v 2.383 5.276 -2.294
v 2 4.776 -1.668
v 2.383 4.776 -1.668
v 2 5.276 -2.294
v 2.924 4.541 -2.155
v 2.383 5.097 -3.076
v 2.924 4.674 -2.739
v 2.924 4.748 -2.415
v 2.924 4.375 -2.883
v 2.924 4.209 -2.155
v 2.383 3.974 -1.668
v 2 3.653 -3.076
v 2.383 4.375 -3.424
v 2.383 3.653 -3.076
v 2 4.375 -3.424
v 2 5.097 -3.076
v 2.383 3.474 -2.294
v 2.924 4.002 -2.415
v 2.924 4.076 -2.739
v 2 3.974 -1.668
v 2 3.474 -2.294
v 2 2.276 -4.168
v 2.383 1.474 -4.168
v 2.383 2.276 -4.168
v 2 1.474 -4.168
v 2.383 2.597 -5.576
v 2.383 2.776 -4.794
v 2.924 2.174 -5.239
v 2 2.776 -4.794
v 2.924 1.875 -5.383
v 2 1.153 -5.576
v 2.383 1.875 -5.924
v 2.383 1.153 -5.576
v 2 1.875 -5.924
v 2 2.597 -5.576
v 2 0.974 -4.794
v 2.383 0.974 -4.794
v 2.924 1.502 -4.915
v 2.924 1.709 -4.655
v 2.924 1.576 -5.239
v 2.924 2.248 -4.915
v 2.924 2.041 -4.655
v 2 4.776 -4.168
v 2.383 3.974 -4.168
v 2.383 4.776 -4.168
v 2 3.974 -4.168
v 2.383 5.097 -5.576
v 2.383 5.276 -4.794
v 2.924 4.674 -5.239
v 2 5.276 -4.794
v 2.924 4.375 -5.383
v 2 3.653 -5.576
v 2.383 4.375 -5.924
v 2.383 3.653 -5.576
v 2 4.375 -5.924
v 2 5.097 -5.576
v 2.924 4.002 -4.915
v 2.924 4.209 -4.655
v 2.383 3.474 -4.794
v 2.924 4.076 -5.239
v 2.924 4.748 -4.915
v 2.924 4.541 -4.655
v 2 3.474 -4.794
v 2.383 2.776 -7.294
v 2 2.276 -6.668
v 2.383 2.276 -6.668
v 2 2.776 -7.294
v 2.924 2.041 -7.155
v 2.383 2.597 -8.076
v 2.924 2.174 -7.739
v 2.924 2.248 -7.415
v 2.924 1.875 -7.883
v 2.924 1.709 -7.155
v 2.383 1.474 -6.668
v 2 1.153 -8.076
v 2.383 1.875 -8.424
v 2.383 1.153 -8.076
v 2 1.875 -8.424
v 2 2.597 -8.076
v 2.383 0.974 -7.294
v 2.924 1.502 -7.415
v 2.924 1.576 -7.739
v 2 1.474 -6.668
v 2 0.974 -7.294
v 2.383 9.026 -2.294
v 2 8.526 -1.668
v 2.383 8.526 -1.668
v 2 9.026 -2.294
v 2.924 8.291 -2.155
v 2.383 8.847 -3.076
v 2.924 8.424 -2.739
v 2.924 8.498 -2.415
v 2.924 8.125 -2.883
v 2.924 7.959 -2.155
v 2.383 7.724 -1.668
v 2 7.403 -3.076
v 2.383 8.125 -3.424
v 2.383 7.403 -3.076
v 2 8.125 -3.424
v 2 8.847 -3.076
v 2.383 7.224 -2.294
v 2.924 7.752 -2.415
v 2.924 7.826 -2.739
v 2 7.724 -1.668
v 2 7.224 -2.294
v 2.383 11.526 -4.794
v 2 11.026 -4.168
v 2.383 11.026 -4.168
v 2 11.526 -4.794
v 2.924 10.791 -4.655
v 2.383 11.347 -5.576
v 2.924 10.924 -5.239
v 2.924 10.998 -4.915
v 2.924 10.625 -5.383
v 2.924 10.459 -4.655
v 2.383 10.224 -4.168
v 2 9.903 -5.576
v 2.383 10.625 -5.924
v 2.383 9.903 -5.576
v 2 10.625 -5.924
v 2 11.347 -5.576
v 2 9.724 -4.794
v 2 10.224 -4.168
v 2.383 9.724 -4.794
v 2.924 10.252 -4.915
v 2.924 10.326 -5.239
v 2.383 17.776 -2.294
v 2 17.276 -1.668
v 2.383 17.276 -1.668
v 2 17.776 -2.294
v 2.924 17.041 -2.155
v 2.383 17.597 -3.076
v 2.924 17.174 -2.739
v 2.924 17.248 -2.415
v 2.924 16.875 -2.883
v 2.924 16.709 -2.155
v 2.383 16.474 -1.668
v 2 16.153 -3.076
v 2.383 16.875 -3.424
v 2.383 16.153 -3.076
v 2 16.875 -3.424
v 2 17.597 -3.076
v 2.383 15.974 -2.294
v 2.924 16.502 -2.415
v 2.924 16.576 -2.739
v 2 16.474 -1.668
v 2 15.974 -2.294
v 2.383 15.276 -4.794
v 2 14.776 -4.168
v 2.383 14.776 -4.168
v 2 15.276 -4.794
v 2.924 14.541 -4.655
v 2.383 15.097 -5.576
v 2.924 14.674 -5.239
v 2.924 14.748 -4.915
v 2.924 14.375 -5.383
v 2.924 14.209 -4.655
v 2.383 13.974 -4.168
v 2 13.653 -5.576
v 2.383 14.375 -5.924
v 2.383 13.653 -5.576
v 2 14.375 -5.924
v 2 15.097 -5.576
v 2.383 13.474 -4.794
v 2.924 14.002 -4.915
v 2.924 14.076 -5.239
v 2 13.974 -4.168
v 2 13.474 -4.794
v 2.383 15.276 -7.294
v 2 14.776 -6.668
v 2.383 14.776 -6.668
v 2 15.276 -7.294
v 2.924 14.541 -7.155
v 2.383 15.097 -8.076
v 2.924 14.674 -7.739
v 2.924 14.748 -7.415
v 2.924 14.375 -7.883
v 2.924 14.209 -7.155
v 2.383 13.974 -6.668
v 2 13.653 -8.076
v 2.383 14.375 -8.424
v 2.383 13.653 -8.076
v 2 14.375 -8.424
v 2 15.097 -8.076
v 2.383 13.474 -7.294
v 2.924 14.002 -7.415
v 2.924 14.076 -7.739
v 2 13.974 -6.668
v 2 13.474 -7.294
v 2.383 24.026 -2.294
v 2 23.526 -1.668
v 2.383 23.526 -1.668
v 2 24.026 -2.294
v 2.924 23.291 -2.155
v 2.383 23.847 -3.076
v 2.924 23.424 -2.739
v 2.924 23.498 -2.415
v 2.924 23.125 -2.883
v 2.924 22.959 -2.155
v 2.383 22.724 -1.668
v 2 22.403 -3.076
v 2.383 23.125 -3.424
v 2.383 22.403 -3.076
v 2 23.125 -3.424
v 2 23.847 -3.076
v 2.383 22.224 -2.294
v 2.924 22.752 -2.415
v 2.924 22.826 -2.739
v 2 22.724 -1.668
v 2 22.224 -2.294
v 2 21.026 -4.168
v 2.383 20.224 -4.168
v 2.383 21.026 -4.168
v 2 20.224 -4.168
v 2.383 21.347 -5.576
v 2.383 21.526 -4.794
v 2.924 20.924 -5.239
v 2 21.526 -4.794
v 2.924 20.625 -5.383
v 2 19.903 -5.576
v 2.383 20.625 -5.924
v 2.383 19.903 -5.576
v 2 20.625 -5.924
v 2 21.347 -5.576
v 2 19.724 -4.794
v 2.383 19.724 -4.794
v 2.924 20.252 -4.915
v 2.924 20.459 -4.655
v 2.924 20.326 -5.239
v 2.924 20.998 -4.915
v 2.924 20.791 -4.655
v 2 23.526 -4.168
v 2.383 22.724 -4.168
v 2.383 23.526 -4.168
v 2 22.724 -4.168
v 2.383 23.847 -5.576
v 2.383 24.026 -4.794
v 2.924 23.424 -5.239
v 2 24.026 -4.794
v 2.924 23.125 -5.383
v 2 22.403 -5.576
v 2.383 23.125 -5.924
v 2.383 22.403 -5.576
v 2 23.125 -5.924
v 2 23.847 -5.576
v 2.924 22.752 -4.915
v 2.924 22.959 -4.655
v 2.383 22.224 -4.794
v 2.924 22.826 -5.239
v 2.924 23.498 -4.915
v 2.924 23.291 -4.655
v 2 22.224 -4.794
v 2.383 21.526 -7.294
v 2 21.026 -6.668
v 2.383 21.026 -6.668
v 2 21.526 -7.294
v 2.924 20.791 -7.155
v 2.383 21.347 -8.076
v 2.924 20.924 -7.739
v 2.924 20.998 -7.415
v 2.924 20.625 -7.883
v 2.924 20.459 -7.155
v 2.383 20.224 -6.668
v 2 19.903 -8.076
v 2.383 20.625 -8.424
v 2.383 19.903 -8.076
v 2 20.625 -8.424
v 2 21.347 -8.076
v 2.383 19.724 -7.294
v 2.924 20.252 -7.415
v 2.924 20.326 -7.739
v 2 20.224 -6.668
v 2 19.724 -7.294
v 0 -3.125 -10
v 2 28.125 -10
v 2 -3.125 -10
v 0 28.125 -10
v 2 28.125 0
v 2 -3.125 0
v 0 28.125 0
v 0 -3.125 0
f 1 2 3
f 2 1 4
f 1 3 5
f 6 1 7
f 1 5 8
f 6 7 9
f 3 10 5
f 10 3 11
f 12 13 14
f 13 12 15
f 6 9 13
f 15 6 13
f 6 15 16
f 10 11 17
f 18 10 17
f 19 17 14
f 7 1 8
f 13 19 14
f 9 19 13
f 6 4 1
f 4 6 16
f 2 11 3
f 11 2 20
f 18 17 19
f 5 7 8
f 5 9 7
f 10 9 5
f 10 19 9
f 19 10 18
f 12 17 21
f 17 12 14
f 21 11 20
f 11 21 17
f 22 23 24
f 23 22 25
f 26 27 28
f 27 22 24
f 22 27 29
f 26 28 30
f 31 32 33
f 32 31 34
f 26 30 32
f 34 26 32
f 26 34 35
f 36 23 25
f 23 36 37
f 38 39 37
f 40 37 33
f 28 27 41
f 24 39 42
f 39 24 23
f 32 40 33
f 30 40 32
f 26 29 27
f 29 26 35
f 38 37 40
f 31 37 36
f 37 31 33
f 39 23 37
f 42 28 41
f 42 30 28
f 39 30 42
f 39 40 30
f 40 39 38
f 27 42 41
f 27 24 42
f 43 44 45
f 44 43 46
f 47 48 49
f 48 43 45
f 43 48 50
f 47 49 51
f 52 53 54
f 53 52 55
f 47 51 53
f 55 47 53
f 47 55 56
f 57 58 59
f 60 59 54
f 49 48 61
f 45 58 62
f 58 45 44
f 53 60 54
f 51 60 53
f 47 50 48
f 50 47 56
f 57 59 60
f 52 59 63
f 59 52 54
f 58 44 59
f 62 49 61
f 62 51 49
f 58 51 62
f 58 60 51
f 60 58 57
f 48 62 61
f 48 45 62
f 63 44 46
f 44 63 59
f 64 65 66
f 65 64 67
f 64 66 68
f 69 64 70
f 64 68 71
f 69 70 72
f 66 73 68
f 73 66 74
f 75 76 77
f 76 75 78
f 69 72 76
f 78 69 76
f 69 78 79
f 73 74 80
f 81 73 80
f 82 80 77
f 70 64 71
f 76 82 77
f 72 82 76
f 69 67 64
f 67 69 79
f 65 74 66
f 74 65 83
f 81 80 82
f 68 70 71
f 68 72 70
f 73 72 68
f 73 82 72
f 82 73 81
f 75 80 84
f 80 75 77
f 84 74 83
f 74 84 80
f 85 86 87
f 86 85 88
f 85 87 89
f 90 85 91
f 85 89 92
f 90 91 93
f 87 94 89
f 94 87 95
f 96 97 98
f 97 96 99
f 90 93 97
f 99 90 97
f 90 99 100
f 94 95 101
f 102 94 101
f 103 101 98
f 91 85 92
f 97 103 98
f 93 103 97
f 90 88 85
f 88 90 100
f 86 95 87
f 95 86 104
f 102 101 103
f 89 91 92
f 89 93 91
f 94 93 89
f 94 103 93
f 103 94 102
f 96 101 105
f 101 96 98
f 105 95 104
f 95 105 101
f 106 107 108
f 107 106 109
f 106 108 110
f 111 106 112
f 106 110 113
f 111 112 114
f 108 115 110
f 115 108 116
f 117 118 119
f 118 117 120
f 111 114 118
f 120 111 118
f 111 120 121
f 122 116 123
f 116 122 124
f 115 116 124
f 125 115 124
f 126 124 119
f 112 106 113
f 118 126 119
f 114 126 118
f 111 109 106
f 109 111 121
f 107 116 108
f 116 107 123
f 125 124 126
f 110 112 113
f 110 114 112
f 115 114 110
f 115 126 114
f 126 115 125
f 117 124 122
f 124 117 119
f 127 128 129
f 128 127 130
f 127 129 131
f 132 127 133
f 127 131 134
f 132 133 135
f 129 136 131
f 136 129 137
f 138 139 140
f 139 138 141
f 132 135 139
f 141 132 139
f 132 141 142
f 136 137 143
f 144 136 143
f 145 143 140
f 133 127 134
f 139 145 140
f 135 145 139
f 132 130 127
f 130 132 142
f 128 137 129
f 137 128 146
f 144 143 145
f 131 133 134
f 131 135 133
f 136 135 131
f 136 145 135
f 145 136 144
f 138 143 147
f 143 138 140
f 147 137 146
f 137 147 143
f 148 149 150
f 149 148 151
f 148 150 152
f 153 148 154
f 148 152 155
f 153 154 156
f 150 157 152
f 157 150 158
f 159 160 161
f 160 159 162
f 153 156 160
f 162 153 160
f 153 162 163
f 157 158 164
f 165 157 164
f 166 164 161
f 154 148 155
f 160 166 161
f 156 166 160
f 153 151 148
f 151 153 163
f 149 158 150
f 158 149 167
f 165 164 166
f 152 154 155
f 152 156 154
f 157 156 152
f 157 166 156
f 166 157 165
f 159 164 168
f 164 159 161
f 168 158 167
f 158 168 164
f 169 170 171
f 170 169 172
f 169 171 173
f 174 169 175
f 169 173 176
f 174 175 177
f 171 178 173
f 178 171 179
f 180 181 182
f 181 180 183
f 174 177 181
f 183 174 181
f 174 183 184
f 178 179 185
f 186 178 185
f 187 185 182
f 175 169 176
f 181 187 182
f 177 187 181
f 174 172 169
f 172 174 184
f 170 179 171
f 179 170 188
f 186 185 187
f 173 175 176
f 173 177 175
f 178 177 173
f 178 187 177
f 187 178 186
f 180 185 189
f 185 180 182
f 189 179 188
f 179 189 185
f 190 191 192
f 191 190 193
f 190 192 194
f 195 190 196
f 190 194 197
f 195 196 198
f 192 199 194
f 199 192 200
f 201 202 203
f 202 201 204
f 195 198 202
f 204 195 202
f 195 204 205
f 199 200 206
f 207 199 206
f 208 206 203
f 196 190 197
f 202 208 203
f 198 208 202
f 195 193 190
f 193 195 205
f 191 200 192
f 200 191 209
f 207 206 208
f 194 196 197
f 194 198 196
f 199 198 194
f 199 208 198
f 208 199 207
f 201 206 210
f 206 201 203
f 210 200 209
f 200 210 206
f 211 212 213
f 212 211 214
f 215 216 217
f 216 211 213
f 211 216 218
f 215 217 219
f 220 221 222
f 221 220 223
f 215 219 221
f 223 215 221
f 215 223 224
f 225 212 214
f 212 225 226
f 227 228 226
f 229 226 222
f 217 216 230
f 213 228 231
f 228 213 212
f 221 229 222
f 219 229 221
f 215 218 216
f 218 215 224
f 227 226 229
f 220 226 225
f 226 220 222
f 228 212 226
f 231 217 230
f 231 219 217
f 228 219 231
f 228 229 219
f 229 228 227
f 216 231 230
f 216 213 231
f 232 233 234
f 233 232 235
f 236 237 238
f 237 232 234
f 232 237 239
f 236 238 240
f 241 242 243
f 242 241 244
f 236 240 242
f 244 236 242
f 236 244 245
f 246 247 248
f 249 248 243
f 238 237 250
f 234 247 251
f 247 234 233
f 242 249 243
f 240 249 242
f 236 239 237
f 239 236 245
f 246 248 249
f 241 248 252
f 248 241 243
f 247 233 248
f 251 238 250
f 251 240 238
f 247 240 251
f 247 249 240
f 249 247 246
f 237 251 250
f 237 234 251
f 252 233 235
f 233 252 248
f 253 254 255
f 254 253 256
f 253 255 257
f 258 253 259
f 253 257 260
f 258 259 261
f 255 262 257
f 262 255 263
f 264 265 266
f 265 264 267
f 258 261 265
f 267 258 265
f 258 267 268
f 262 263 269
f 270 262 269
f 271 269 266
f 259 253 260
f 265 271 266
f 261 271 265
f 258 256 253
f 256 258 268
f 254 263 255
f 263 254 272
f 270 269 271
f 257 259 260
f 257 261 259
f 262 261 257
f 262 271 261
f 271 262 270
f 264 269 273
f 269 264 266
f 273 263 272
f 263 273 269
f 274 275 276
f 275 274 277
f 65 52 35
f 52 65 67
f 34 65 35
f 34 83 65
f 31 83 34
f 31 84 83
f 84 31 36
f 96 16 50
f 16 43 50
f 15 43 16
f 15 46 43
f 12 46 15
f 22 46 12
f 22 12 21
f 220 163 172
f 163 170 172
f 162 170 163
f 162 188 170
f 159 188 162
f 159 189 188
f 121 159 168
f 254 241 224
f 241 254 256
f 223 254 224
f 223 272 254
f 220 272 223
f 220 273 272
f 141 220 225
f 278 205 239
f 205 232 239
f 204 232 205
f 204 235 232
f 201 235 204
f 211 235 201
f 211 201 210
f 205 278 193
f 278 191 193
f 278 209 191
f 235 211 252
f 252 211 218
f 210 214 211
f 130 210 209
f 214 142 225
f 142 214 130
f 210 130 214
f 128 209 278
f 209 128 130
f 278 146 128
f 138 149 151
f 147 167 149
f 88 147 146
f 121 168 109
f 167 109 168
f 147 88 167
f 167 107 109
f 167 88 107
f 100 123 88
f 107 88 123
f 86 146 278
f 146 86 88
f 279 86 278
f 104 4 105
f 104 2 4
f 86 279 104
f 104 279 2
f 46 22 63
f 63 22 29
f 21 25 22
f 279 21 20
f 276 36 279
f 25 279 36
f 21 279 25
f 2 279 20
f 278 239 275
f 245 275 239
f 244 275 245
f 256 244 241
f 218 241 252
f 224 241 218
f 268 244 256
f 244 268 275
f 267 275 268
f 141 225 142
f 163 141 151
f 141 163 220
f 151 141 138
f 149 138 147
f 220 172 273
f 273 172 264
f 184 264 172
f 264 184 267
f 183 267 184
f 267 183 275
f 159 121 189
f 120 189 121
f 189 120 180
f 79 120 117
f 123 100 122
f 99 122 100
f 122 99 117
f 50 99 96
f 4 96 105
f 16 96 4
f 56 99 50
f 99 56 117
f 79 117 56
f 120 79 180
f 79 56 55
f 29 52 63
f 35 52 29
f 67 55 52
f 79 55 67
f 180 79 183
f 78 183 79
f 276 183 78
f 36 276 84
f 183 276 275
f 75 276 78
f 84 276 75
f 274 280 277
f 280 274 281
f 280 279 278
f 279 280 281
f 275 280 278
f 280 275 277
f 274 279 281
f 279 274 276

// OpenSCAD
/*
Braille Module
http://creativecommons.org/licenses/by/3.0/
*/


// mm sizes from http://dots.physics.orst.edu/gs_layout.html
radius = 0.25;
spacing = 2.5;
distance = 3.75 + spacing;

plate_height = 10;
plate_thickness = 2;

$fn = 7;



module letter(bitmap) {
	row_size = 2;
	col_size = 3;
	bitmap_size = row_size * col_size;
	
	function loc_x(loc) = floor(loc / row_size) * spacing + spacing;
	function loc_y(loc) = loc % row_size * spacing  + (distance-spacing)/2;

	for (loc = [0:bitmap_size - 1]) {
		if (bitmap[loc] != 0) {
			union() {
				translate(v = [loc_x(loc), loc_y(loc), 0]) {
					sphere(radius = radius* bitmap[loc], center = true);
				}
			}
		}
	}
}


module braille_char(char) {
	if (char == "A") {
		letter([
			1,0,
			0,0,
			0,0
		]);
	} else if (char == "B") {
		letter([
			1,0,
			1,0,
			0,0
		]);
	} else if (char == "C") {
		letter([
			1,1,
			0,0,
			0,0
		]);
	} else if (char == "D") {
		letter([
			1,1,
			0,1,
			0,0
		]);
	} else if (char == "E") {
		letter([
			1,0,
			0,1,
			0,0
		]);
	} else if (char == "F") {
		letter([
			1,1,
			1,0,
			0,0
		]);
	} else if (char == "G") {
		letter([
			1,1,
			1,1,
			0,0
		]);
	} else if (char == "H") {
		letter([
			1,0,
			1,1,
			0,0
		]);
	} else if (char == "I") {
		letter([
			0,1,
			1,0,
			0,0
		]);
	} else if (char == "J") {
		letter([
			0,1,
			1,1,
			0,0
		]);
	} else if (char == "K") {
		letter([
			1,0,
			0,0,
			1,0
		]);
	} else if (char == "L") {
		letter([
			1,0,
			1,0,
			1,0
		]);
	} else if (char == "M") {
		letter([
			1,1,
			0,0,
			1,0
		]);
	} else if (char == "N") {
		letter([
			1,1,
			0,1,
			1,0
		]);
	} else if (char == "O") {
		letter([
			1,0,
			0,1,
			1,0
		]);
	} else if (char == "P") {
		letter([
			1,1,
			1,0,
			1,0
		]);
	} else if (char == "Q") {
		letter([
			1,1,
			1,1,
			1,0
		]);
	} else if (char == "R") {
		letter([
			1,0,
			1,1,
			1,0
		]);
	} else if (char == "S") {
		letter([
			0,1,
			1,0,
			1,0
		]);
	} else if (char == "T") {
		letter([
			0,1,
			1,1,
			1,0
		]);
	} else if (char == "U") {
		letter([
			1,0,
			0,0,
			1,1
		]);
	} else if (char == "V") {
		letter([
			1,0,
			1,0,
			1,1
		]);
	} else if (char == "W") {
		letter([
			0,1,
			1,1,
			0,1
		]);
	} else if (char == "X") {
		letter([
			1,1,
			0,0,
			1,1
		]);
	} else if (char == "Y") {
		letter([
			1,1,
			0,1,
			1,1
		]);
	} else if (char == "Z") {
		letter([
			1,0,
			0,1,
			1,1
		]);
	} else if (char == "CH") {
		letter([
			1,0,
			0,0,
			0,1
		]);
	} else if (char == "SH") {
		letter([
			1,1,
			0,0,
			0,1
		]);
	} else if (char == "TH") {
		letter([
			1,1,
			0,1,
			0,1
		]);
	} else if (char == "WH") {
		letter([
			1,0,
			0,1,
			0,1
		]);
	} else if (char == "OU") {
		letter([
			1,0,
			1,1,
			0,1
		]);
	} else if (char == "ST") {
		letter([
			0,1,
			0,0,
			1,0
		]);
	} else if (char == "AND") {
		letter([
			1,1,
			1,0,
			1,1
		]);
	} else if (char == "FOR") {
		letter([
			1,1,
			1,1,
			1,1
		]);
	} else if (char == "OF") {
		letter([
			1,0,
			1,1,
			1,1
		]);
	} else if (char == "THE") {
		letter([
			0,1,
			1,0,
			1,1
		]);
	} else if (char == "WITH") {
		letter([
			0,1,
			1,1,
			1,1
		]);
	} else if (char == "IN") {
		letter([
			0,0,
			0,1,
			1,0
		]);
	} else if (char == "EN") {
		letter([
			0,0,
			1,0,
			0,1
		]);
	} else if (char == "CON") {
		letter([
			0,0,
			1,1,
			0,0
		]);
	} else if (char == "DIS") {
		letter([
			0,0,
			1,1,
			0,1
		]);
	} else if (char == "COM") {
		letter([
			0,0,
			0,0,
			1,1
		]);
	} else if (char == "BE") {
		letter([
			0,0,
			1,0,
			1,0
		]);
	} else if (char == "EA") {
		letter([
			0,0,
			1,0,
			0,0
		]);
	} else if (char == "BB") {
		letter([
			0,0,
			1,0,
			1,0
		]);
	} else if (char == "CC") {
		letter([
			0,0,
			1,1,
			0,0
		]);
	} else if (char == "DD") {
		letter([
			0,0,
			1,1,
			0,1
		]);
	} else if (char == "FF") {
		letter([
			0,0,
			1,1,
			1,0
		]);
	} else if (char == "GG") {
		letter([
			0,0,
			1,1,
			1,1
		]);
	} else if (char == "AR") {
		letter([
			0,1,
			0,1,
			1,0
		]);
	} else if (char == "BLE") {
		letter([
			0,1,
			0,1,
			1,1
		]);
	} else if (char == "ED") {
		letter([
			1,1,
			1,0,
			0,1
		]);
	} else if (char == "ER") {
		letter([
			1,1,
			1,1,
			0,1
		]);
	} else if (char == "GH") {
		letter([
			1,0,
			1,0,
			0,1
		]);
	} else if (char == "ING") {
		letter([
			0,1,
			0,0,
			1,1
		]);
	} else if (char == "OW") {
		letter([
			0,1,
			1,0,
			0,1
		]);
	} else if (char == "cap") {
		letter([
			0,0,
			0,0,
			0,1
		]);
	} else if (char == "#") {
		letter([
			0,1,
			0,1,
			1,1
		]);
	} else if (char == ".") {
		letter([
			0,0,
			1,1,
			0,1
		]);
	} else if (char == "?") {
		letter([
			0,0,
			1,0,
			1,1
		]);
	} else if (char == "!") {
		letter([
			0,0,
			1,1,
			1,0
		]);
	} else if (char == "-") {
		letter([
			0,0,
			0,0,
			1,1
		]);
	} else if (char == "quote") {
		letter([
			0,0,
			0,1,
			1,1
		]);
	} else if (char == "1") {
		letter([
			1,0,
			0,0,
			0,0
		]);
	} else if (char == "2") {
		letter([
			1,0,
			1,0,
			0,0
		]);
	} else if (char == "3") {
		letter([
			1,1,
			0,0,
			0,0
		]);
	} else if (char == "4") {
		letter([
			1,1,
			0,1,
			0,0
		]);
	} else if (char == "5") {
		letter([
			1,0,
			0,1,
			0,0
		]);
	} else if (char == "6") {
		letter([
			1,1,
			1,0,
			0,0
		]);
	} else if (char == "7") {
		letter([
			1,1,
			1,1,
			0,0
		]);
	} else if (char == "8") {
		letter([
			1,0,
			1,1,
			0,0
		]);
	} else if (char == "9") {
		letter([
			0,1,
			1,0,
			0,0
		]);
	} else if (char == "0") {
		letter([
			0,1,
			1,1,
			0,0
		]);
        } else if (char == "dot4") {
		letter([
			0,1,
			0,0,
			0,0
		]);
        } else if (char == "dot5") {
		letter([
			0,0,
			0,1,
			0,0
		]);
        } else if (char == "dot45") {
		letter([
			0,1,
			0,1,
			0,0
		]);
         } else if (char == "dot456") {
		letter([
			0,1,
			0,1,
			0,1
		]);
        } else if (char == "dot56") {
		letter([
			0,0,
			0,1,
			0,1 
		]);
        } else if (char == "dot46") {
		letter([
			0,1,
			0,0,
			0,1 
		]);
        } else if (char == "n.") {
		letter([
			0,1,
			0,0,
			0,1 
		]);
        } else if (char == "grade1") {
		letter([
			0,0,
			0,1,
			0,1 
		]);
        } else if (char == "n1") {
		letter([
			0,0,
			1,0,
			0,0
		]);
	} else if (char == "n2") {
		letter([
			0,0,
			1,0,
			1,0
		]);
	} else if (char == "n3") {
		letter([
			0,0,
			1,1,
			0,0
		]);
	} else if (char == "n4") {
		letter([
			0,0,
			1,1,
			0,1
		]);
	} else if (char == "n5") {
		letter([
			0,0,
			1,0,
			0,1
		]);
	} else if (char == "n6") {
		letter([
			0,0,
			1,1,
			1,0
		]);
	} else if (char == "n7") {
		letter([
			0,0,
			1,1,
			1,1
		]);
	} else if (char == "n8") {
		letter([
			0,0,
			1,0,
			1,1
		]);
	} else if (char == "n9") {
		letter([
			0,0,
			0,1,
			1,0
		]);
	} else if (char == "n0") {
		letter([
			0,0,
			0,1,
			1,1
        ]);
    } else if (char == "+") {
		letter([
			0,1,
			0,0,
			1,1 
		]);
        
        } else if (char == "-") {
		letter([
			0,0,
			0,0,
			1,1 
		]);
            //for the next four characters (*1,*2,/1,/2) this stands for two two parts that need to be included for multiplication and divison. So if you want a multiplication symbol for examply you would input this: chars = ["*1","*2"]; since multplication and division needs two cells.
char_count = 2;
        } else if (char == "*1") {
		letter([
			0,1,
			0,0,
			0,0 
		]);
        } else if (char == "*2") {
		letter([
			1,0,
			0,0,
			0,1 
		]);
        } else if (char == "/1") {
		letter([
			0,1,
			0,0,
			0,1
		]);
         } else if (char == "/2") {
		letter([
			0,1,
			0,0,
			1,0
		]);
	} else {
		echo("Invalid Character: ", char);
	}

}

module braille_str(chars, char_count) {
	echo(str("Total Width: ", distance * char_count, "mm"));
	union() {
		for (count = [0:char_count-1]) {
			translate(v = [0, count * distance, plate_thickness]) {
				braille_char(chars[count]);
			}
		}
		translate(v = [0, -distance/2, 0]) {
			color([0,0,1]) {
				cube(size = [plate_height, distance * (char_count+1), plate_thickness]);
			}
		}
	}
}






chars = 
["T","E","S","T"];
char_count = 4;

union()
{
	rotate([0,90,0]) braille_str(chars, char_count);
	// uncomment next line to have a small "foot" added for better adhesion to the print platform or raft
	//translate([-19,20,-plate_height]) cube(size = [20,5,2]);
}
